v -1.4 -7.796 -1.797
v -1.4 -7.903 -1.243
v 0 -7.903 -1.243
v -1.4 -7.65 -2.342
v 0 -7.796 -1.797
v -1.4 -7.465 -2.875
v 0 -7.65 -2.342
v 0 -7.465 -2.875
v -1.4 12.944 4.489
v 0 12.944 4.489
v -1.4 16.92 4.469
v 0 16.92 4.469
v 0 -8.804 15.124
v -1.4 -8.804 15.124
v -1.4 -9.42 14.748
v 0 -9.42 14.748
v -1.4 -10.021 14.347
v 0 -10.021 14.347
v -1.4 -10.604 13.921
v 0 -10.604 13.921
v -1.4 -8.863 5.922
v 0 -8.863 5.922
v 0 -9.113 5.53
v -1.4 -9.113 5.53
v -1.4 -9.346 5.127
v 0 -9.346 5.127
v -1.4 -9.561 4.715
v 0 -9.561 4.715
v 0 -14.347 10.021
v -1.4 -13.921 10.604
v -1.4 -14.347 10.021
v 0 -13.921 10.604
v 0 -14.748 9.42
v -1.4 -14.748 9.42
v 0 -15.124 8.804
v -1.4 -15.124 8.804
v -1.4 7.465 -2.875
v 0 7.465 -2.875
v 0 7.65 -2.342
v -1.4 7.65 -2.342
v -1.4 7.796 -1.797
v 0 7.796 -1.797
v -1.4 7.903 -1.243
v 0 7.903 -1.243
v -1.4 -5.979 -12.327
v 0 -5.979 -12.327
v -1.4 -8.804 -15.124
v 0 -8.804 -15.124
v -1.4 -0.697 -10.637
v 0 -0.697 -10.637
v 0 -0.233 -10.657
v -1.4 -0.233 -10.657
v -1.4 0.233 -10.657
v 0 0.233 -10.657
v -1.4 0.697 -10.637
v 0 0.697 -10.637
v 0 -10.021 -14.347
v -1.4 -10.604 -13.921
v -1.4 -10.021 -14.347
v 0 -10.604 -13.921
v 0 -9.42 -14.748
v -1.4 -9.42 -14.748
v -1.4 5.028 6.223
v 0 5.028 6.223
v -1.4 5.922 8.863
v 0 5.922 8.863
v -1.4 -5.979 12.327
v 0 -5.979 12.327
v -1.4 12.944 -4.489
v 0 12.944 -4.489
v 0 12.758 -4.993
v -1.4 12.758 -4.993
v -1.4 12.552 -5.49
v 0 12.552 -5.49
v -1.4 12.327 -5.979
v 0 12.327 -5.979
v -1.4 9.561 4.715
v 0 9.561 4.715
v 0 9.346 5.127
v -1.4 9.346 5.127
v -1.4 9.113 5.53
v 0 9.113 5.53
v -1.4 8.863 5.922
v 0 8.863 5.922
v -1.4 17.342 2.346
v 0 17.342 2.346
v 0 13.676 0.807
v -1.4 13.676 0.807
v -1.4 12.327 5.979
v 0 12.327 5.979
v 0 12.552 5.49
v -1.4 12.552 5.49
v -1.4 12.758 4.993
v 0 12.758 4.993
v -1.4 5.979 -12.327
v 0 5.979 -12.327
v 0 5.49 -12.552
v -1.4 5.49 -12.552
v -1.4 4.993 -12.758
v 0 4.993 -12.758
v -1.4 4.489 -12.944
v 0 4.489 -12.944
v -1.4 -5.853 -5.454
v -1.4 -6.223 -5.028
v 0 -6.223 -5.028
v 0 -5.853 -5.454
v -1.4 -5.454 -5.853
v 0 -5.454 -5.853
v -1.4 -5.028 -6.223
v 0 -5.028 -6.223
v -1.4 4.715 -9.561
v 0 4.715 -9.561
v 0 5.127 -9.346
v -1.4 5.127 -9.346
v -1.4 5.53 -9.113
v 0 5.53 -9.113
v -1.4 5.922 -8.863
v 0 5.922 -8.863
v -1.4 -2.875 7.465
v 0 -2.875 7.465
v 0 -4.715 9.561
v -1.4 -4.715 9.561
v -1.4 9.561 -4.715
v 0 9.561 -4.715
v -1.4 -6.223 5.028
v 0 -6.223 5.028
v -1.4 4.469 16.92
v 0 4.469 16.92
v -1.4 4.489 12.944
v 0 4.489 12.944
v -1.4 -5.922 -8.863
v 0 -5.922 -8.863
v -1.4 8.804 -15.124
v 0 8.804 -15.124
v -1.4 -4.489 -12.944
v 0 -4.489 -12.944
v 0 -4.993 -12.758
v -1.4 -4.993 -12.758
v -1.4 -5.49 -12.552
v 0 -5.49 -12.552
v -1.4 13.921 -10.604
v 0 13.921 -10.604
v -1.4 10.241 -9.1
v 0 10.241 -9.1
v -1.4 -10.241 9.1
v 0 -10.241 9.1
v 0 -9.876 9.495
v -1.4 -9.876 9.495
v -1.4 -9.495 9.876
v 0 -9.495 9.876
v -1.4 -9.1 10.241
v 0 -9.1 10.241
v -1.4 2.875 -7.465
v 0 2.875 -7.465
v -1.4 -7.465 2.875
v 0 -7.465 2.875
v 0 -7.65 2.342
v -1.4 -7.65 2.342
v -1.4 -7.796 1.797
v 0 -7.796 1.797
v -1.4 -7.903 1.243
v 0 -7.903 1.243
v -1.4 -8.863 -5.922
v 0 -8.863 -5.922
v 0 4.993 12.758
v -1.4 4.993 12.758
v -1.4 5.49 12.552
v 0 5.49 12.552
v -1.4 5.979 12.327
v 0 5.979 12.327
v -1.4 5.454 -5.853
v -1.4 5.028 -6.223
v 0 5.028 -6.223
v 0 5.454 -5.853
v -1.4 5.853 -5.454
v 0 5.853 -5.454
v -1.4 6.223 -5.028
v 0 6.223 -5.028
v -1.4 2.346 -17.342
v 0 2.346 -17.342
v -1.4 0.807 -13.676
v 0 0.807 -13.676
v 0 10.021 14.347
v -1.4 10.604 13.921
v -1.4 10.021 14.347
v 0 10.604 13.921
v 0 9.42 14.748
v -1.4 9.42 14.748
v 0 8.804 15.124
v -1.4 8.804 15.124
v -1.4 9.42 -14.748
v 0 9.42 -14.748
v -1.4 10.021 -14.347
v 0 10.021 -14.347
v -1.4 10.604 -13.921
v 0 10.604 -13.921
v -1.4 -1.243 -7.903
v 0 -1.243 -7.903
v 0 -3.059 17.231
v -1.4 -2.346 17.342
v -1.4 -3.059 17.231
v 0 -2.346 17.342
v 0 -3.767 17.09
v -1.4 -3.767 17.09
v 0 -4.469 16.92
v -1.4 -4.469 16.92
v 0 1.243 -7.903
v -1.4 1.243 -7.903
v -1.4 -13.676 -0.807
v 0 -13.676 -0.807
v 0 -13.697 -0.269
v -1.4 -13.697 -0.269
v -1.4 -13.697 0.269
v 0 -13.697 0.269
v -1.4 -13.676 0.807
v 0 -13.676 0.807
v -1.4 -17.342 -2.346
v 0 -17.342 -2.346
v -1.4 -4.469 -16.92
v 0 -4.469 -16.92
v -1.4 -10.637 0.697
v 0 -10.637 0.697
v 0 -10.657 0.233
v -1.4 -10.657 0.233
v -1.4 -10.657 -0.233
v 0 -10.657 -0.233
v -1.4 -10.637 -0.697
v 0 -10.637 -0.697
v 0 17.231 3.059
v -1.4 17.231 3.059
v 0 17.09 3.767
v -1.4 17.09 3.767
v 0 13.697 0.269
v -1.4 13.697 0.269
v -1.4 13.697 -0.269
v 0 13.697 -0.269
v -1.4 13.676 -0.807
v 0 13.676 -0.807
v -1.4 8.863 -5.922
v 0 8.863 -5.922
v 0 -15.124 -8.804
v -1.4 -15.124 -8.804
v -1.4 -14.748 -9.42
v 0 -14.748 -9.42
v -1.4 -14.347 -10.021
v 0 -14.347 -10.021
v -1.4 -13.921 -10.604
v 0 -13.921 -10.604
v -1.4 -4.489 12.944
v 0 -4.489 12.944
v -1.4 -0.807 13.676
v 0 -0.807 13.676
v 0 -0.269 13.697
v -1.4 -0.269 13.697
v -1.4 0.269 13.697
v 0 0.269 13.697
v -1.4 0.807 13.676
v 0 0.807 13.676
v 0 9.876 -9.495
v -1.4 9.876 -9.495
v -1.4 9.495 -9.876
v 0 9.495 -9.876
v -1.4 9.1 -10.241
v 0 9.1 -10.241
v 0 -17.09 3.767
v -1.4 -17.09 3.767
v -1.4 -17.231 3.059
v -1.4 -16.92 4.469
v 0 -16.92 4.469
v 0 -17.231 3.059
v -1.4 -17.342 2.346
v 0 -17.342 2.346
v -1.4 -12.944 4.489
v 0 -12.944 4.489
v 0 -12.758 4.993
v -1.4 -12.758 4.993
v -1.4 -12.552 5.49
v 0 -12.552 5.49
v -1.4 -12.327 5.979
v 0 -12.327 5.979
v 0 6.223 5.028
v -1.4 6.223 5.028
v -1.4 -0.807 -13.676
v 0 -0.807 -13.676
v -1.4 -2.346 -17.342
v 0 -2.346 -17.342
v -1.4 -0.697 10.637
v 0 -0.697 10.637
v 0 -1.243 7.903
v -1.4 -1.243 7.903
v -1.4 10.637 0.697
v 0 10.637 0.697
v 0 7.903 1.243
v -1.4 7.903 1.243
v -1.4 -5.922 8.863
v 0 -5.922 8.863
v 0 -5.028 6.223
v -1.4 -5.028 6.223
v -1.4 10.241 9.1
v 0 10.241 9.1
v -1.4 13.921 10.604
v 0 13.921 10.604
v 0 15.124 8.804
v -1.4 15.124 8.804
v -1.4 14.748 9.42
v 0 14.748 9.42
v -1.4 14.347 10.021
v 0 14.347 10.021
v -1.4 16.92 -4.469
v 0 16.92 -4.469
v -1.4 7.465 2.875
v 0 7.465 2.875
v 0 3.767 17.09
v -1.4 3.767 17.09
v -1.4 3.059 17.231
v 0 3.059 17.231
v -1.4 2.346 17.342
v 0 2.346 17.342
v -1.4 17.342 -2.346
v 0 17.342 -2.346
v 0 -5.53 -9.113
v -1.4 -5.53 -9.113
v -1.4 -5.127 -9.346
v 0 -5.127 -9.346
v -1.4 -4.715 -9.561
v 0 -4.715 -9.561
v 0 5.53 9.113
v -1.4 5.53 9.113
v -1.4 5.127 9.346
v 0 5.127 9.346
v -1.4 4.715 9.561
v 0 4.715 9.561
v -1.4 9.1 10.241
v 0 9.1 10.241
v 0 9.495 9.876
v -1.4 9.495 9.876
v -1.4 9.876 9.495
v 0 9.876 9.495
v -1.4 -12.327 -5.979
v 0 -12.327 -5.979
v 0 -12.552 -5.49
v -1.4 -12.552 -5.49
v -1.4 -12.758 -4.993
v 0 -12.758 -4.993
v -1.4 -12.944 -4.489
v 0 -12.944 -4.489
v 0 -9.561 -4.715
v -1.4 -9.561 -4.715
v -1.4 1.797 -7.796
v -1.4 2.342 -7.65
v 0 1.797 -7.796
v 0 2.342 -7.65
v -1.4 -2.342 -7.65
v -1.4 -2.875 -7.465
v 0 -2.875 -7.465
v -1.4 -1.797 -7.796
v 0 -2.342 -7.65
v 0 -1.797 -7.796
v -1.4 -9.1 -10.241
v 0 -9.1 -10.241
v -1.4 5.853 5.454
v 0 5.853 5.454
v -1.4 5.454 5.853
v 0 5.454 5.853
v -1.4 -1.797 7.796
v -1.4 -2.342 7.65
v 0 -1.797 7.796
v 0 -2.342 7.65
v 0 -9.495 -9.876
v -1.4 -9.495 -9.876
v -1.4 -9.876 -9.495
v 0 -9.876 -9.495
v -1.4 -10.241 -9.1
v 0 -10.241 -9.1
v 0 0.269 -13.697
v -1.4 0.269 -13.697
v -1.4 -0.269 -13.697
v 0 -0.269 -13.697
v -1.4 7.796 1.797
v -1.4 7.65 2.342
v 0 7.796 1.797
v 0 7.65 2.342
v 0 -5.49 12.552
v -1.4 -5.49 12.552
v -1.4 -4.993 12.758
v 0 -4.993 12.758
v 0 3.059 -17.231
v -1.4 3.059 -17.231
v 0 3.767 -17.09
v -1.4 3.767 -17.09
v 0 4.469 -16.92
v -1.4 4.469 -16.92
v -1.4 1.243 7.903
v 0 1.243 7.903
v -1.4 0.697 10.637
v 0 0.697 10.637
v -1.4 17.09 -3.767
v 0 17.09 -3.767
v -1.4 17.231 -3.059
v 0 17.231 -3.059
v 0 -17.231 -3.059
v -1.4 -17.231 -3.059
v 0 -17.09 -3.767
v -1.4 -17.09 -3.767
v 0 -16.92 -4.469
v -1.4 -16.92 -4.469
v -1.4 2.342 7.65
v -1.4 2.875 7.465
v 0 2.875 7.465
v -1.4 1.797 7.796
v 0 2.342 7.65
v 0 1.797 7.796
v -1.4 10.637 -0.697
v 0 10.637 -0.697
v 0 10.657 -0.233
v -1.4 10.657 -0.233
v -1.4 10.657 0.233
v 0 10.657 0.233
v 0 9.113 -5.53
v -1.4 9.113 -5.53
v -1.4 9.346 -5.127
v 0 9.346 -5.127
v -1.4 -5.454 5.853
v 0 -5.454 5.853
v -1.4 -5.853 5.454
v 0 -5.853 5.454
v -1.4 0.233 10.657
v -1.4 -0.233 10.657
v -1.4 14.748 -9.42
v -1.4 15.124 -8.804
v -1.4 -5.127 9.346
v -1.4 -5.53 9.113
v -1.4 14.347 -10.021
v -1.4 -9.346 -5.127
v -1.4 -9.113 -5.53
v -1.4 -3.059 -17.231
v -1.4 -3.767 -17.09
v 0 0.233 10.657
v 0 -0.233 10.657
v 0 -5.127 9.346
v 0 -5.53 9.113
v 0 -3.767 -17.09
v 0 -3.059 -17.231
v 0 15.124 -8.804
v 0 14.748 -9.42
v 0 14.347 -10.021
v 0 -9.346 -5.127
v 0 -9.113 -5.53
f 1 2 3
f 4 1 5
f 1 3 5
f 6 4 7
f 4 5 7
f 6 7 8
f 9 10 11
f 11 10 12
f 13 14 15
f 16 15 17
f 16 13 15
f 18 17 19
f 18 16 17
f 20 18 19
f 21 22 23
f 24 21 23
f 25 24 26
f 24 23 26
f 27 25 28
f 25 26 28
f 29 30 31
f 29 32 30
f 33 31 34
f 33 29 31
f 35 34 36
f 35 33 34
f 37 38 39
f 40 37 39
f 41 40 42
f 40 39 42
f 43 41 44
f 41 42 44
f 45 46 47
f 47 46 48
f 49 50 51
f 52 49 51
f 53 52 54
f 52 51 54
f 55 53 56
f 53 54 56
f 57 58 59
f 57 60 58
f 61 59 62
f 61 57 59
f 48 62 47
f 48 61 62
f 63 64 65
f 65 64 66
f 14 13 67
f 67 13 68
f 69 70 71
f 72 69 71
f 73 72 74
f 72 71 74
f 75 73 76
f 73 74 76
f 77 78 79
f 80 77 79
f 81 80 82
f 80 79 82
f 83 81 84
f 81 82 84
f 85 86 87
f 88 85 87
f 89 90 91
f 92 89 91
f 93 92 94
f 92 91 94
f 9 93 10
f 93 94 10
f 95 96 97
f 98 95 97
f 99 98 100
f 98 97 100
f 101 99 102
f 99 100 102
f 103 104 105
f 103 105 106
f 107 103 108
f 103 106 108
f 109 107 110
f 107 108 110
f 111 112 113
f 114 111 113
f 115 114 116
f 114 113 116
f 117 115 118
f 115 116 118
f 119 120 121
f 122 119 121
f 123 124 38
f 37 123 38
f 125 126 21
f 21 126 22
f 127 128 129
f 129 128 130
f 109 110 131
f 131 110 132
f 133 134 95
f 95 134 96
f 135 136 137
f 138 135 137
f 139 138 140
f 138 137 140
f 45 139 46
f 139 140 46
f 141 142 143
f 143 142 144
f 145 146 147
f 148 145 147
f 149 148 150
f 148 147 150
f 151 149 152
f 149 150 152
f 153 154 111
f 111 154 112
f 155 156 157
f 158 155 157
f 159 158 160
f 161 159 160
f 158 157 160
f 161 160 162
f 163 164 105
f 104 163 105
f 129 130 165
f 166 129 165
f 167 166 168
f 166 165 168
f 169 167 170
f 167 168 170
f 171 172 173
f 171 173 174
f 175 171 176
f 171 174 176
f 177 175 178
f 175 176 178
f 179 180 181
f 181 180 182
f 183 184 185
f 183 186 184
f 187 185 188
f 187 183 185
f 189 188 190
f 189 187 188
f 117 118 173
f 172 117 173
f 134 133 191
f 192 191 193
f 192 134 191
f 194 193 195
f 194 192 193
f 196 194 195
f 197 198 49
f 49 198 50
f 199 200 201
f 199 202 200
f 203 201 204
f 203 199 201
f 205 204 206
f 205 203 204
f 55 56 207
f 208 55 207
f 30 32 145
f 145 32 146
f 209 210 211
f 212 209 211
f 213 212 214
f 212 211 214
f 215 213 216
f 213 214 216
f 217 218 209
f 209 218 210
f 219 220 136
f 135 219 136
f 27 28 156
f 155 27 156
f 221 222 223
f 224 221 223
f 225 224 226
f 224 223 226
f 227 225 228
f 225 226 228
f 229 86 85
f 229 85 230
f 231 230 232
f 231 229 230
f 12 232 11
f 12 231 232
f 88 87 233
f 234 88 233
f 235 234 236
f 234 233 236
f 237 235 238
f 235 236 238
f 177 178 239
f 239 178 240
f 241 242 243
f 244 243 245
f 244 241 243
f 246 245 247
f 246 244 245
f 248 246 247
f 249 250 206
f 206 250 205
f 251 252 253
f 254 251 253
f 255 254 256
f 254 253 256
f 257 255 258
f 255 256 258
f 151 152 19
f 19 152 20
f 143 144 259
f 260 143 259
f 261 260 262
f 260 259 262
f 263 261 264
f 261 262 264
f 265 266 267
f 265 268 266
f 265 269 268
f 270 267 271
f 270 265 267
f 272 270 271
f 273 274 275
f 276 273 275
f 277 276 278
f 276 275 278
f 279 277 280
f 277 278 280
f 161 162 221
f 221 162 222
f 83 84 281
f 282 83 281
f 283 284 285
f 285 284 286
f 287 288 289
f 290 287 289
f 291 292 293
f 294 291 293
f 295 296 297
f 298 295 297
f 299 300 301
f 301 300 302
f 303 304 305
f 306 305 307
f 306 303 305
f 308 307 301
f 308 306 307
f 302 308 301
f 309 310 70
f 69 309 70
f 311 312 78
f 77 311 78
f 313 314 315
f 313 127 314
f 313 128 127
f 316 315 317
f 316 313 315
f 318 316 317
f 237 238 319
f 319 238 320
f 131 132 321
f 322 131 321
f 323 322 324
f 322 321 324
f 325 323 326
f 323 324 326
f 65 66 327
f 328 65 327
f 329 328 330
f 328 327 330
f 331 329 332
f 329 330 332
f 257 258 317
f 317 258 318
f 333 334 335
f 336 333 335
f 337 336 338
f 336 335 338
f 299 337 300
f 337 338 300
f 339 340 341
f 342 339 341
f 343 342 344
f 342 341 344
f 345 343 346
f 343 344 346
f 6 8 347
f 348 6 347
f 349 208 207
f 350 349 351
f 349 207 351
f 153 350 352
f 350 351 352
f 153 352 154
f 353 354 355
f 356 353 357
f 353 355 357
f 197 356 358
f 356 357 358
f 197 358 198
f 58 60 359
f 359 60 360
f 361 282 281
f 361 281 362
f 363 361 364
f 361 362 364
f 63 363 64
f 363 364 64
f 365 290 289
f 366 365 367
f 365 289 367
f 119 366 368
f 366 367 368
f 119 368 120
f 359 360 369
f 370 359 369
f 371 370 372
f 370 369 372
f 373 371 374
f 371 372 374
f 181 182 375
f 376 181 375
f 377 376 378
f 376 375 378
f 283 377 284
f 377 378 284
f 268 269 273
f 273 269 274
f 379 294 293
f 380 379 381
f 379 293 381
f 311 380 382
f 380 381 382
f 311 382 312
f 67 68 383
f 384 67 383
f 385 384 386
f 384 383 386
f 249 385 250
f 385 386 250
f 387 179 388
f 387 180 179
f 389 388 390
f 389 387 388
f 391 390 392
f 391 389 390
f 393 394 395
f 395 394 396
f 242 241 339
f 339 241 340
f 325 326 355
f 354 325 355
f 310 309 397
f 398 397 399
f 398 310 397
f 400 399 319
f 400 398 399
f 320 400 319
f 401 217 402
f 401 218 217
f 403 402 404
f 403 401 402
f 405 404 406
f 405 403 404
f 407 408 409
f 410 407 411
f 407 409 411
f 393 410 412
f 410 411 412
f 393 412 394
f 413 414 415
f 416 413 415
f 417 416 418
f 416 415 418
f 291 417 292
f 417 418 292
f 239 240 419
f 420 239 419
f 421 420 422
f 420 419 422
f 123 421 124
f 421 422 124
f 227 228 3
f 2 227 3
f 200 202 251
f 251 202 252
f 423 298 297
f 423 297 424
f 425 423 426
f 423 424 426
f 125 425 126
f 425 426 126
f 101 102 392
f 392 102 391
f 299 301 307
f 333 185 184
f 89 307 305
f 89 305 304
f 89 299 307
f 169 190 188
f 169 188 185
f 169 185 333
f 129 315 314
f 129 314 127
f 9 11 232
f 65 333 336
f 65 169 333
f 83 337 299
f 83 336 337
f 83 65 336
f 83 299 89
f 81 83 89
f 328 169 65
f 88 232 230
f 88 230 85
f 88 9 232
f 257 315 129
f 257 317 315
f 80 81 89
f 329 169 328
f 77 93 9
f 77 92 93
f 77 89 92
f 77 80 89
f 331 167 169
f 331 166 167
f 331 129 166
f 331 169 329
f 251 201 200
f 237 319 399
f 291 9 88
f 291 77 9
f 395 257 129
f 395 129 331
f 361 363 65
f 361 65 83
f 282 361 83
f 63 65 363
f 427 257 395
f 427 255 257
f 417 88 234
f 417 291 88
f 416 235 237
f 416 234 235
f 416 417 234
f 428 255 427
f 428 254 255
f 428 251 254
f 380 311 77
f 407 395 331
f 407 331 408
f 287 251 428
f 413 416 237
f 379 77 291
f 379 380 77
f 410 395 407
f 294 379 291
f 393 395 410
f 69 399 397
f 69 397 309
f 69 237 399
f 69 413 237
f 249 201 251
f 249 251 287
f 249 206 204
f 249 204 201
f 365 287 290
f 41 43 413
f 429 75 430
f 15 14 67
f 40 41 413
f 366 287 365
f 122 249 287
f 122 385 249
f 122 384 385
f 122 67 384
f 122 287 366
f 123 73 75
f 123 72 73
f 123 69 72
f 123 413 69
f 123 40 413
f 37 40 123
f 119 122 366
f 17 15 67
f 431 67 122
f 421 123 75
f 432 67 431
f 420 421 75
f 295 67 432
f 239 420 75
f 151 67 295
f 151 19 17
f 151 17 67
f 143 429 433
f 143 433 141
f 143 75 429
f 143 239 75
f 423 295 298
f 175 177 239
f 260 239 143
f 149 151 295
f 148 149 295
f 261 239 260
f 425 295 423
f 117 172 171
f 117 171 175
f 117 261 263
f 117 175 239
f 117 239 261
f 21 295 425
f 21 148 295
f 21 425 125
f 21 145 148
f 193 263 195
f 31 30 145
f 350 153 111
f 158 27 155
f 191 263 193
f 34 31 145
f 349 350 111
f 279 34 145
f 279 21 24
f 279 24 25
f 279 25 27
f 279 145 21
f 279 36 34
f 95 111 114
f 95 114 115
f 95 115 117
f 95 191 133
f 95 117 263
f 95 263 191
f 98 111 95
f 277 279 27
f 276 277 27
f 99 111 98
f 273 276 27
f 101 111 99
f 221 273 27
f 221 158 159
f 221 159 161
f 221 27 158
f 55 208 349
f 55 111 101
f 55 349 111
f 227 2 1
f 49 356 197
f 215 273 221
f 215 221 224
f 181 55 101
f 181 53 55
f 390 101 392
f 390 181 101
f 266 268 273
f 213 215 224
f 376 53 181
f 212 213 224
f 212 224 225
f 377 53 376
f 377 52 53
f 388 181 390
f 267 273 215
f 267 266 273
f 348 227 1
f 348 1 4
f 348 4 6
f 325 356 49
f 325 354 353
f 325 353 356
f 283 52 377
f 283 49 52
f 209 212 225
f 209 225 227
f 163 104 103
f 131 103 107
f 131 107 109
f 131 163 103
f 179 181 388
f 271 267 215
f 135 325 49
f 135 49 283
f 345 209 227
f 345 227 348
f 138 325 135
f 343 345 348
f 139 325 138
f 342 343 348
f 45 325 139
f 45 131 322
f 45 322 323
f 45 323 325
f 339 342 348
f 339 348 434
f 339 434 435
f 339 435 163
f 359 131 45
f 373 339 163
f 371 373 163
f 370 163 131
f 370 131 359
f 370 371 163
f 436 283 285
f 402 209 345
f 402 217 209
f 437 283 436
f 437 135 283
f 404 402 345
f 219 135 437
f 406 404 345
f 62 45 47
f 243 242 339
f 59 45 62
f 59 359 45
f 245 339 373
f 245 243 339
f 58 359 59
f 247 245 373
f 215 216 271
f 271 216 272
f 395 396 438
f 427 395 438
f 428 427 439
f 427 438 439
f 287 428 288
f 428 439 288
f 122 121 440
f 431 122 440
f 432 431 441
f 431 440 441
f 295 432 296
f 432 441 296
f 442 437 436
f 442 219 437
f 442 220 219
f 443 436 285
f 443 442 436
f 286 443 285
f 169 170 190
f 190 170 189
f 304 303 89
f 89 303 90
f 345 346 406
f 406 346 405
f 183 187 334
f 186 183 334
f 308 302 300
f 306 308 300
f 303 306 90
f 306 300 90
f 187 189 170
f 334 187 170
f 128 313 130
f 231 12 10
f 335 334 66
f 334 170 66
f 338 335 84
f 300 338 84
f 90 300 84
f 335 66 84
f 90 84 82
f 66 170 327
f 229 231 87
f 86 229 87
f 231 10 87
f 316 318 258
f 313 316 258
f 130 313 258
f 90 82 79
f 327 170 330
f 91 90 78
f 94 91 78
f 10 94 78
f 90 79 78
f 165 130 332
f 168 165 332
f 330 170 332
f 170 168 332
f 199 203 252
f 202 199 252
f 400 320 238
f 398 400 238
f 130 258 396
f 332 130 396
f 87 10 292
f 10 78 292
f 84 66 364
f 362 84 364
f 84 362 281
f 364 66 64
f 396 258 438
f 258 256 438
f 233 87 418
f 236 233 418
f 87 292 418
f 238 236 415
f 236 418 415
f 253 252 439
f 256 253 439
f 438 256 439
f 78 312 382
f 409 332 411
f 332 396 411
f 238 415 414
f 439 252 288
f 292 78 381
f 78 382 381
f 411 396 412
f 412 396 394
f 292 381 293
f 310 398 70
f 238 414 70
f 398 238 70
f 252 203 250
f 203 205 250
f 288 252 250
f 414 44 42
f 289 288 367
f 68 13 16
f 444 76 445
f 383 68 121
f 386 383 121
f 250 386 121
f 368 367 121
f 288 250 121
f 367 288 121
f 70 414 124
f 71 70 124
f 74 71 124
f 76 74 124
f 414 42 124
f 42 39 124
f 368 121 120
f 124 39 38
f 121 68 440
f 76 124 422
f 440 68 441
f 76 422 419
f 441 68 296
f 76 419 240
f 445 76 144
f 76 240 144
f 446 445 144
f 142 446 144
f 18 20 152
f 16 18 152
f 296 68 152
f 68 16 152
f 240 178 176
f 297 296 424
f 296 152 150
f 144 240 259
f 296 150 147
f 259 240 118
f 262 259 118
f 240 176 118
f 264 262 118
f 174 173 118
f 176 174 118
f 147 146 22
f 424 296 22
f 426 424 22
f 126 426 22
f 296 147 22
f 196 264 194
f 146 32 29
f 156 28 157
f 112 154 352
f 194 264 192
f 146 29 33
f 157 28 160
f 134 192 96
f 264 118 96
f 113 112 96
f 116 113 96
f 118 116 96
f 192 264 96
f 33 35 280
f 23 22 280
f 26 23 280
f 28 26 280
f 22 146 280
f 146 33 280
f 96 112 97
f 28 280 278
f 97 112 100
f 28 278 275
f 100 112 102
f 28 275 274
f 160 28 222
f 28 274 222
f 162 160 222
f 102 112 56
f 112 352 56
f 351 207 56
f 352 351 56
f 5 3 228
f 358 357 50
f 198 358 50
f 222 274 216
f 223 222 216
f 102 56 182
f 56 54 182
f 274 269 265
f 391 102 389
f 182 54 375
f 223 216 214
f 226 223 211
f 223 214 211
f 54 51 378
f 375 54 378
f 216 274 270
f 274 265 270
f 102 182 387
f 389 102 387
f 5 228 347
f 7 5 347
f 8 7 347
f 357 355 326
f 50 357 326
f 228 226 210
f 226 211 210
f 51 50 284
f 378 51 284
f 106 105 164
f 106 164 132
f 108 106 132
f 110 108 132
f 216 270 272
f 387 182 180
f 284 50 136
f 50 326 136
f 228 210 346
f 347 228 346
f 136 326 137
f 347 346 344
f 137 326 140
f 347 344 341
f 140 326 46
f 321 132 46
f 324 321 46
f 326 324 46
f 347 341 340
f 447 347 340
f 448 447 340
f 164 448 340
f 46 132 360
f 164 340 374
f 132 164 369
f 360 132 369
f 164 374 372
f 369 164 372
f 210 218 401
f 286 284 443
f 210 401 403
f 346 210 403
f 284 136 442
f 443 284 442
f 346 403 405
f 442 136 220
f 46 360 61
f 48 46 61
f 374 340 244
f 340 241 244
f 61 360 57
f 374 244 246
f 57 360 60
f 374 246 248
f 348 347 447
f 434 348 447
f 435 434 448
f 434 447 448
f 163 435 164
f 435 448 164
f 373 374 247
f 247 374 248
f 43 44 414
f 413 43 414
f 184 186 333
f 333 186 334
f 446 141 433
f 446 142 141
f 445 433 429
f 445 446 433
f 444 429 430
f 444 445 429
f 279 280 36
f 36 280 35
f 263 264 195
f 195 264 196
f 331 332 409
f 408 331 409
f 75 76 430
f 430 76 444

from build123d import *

# Parameters (mm, degrees)
SECSKE_W      = 1.4
SECSKE_H      = 9.5
EXTCUT_DEPTH  = 25.788303693
EXTCUTS_COUNT = 16
EXTCUTS_ANGLE = 337.5
INTCUT_DEPTH  = 25.565286833
INTCUTS_COUNT = 12
INTCUTS_ANGLE = 330


with BuildPart() as part:
    # SecSke → Body (revolve)
    with BuildSketch(Plane.XY, mode=Mode.PRIVATE) as body_sk:
        with Locations((-0.7, 12.75)):
            Rectangle(SECSKE_W, SECSKE_H)
    revolve(body_sk.sketch.rotate(Axis((-34.925, 0, 0), (1, 0, 0)), 90), axis=Axis((-34.925, 0, 0), (1, 0, 0)))

    # ExtCutSke → ExtCut (cut, through all)
    with BuildSketch(Plane(origin=(0, 0, 0), x_dir=(0, 0, -1), z_dir=(1, 0, 0))):
        with BuildLine():
            Line((-2.696172468, 18.176118371), (-0.80653001, 13.67623886))
            ThreePointArc((-0.80653001, 13.67623886), (0, 13.7), (0.80653001, 13.67623886))
            Line((0.80653001, 13.67623886), (2.696172468, 18.176118371))
            ThreePointArc((2.696172468, 18.176118371), (0, 18.375), (-2.696172468, 18.176118371))
        make_face()
    extcut = extrude(amount=-EXTCUT_DEPTH, mode=Mode.SUBTRACT)

    # ExtCuts: ExtCut ×16 about axis
    extcuts_axis = Axis((-34.925, 0, 0), (1, 0, 0))
    for i in range(1, EXTCUTS_COUNT):
        add(extcut.rotate(extcuts_axis, i * EXTCUTS_ANGLE / (EXTCUTS_COUNT - 1)), mode=Mode.SUBTRACT)

    # IntCutSke → IntCut (cut, through all)
    with BuildSketch(Plane(origin=(0, 0, 0), x_dir=(0, 0, -1), z_dir=(1, 0, 0))):
        with BuildLine():
            Line((-0.697197358, 10.637176122), (-1.326257139, 7.483384395))
            ThreePointArc((-1.326257139, 7.483384395), (0, 7.6), (1.326257139, 7.483384395))
            Line((1.326257139, 7.483384395), (0.697197358, 10.637176122))
            ThreePointArc((0.697197358, 10.637176122), (0, 10.66), (-0.697197358, 10.637176122))
        make_face()
    intcut = extrude(amount=-INTCUT_DEPTH, mode=Mode.SUBTRACT)

    # IntCuts: IntCut ×12 about axis
    intcuts_axis = Axis((-34.925, 0, 0), (1, 0, 0))
    for i in range(1, INTCUTS_COUNT):
        add(intcut.rotate(intcuts_axis, i * INTCUTS_ANGLE / (INTCUTS_COUNT - 1)), mode=Mode.SUBTRACT)


solid = part.part
